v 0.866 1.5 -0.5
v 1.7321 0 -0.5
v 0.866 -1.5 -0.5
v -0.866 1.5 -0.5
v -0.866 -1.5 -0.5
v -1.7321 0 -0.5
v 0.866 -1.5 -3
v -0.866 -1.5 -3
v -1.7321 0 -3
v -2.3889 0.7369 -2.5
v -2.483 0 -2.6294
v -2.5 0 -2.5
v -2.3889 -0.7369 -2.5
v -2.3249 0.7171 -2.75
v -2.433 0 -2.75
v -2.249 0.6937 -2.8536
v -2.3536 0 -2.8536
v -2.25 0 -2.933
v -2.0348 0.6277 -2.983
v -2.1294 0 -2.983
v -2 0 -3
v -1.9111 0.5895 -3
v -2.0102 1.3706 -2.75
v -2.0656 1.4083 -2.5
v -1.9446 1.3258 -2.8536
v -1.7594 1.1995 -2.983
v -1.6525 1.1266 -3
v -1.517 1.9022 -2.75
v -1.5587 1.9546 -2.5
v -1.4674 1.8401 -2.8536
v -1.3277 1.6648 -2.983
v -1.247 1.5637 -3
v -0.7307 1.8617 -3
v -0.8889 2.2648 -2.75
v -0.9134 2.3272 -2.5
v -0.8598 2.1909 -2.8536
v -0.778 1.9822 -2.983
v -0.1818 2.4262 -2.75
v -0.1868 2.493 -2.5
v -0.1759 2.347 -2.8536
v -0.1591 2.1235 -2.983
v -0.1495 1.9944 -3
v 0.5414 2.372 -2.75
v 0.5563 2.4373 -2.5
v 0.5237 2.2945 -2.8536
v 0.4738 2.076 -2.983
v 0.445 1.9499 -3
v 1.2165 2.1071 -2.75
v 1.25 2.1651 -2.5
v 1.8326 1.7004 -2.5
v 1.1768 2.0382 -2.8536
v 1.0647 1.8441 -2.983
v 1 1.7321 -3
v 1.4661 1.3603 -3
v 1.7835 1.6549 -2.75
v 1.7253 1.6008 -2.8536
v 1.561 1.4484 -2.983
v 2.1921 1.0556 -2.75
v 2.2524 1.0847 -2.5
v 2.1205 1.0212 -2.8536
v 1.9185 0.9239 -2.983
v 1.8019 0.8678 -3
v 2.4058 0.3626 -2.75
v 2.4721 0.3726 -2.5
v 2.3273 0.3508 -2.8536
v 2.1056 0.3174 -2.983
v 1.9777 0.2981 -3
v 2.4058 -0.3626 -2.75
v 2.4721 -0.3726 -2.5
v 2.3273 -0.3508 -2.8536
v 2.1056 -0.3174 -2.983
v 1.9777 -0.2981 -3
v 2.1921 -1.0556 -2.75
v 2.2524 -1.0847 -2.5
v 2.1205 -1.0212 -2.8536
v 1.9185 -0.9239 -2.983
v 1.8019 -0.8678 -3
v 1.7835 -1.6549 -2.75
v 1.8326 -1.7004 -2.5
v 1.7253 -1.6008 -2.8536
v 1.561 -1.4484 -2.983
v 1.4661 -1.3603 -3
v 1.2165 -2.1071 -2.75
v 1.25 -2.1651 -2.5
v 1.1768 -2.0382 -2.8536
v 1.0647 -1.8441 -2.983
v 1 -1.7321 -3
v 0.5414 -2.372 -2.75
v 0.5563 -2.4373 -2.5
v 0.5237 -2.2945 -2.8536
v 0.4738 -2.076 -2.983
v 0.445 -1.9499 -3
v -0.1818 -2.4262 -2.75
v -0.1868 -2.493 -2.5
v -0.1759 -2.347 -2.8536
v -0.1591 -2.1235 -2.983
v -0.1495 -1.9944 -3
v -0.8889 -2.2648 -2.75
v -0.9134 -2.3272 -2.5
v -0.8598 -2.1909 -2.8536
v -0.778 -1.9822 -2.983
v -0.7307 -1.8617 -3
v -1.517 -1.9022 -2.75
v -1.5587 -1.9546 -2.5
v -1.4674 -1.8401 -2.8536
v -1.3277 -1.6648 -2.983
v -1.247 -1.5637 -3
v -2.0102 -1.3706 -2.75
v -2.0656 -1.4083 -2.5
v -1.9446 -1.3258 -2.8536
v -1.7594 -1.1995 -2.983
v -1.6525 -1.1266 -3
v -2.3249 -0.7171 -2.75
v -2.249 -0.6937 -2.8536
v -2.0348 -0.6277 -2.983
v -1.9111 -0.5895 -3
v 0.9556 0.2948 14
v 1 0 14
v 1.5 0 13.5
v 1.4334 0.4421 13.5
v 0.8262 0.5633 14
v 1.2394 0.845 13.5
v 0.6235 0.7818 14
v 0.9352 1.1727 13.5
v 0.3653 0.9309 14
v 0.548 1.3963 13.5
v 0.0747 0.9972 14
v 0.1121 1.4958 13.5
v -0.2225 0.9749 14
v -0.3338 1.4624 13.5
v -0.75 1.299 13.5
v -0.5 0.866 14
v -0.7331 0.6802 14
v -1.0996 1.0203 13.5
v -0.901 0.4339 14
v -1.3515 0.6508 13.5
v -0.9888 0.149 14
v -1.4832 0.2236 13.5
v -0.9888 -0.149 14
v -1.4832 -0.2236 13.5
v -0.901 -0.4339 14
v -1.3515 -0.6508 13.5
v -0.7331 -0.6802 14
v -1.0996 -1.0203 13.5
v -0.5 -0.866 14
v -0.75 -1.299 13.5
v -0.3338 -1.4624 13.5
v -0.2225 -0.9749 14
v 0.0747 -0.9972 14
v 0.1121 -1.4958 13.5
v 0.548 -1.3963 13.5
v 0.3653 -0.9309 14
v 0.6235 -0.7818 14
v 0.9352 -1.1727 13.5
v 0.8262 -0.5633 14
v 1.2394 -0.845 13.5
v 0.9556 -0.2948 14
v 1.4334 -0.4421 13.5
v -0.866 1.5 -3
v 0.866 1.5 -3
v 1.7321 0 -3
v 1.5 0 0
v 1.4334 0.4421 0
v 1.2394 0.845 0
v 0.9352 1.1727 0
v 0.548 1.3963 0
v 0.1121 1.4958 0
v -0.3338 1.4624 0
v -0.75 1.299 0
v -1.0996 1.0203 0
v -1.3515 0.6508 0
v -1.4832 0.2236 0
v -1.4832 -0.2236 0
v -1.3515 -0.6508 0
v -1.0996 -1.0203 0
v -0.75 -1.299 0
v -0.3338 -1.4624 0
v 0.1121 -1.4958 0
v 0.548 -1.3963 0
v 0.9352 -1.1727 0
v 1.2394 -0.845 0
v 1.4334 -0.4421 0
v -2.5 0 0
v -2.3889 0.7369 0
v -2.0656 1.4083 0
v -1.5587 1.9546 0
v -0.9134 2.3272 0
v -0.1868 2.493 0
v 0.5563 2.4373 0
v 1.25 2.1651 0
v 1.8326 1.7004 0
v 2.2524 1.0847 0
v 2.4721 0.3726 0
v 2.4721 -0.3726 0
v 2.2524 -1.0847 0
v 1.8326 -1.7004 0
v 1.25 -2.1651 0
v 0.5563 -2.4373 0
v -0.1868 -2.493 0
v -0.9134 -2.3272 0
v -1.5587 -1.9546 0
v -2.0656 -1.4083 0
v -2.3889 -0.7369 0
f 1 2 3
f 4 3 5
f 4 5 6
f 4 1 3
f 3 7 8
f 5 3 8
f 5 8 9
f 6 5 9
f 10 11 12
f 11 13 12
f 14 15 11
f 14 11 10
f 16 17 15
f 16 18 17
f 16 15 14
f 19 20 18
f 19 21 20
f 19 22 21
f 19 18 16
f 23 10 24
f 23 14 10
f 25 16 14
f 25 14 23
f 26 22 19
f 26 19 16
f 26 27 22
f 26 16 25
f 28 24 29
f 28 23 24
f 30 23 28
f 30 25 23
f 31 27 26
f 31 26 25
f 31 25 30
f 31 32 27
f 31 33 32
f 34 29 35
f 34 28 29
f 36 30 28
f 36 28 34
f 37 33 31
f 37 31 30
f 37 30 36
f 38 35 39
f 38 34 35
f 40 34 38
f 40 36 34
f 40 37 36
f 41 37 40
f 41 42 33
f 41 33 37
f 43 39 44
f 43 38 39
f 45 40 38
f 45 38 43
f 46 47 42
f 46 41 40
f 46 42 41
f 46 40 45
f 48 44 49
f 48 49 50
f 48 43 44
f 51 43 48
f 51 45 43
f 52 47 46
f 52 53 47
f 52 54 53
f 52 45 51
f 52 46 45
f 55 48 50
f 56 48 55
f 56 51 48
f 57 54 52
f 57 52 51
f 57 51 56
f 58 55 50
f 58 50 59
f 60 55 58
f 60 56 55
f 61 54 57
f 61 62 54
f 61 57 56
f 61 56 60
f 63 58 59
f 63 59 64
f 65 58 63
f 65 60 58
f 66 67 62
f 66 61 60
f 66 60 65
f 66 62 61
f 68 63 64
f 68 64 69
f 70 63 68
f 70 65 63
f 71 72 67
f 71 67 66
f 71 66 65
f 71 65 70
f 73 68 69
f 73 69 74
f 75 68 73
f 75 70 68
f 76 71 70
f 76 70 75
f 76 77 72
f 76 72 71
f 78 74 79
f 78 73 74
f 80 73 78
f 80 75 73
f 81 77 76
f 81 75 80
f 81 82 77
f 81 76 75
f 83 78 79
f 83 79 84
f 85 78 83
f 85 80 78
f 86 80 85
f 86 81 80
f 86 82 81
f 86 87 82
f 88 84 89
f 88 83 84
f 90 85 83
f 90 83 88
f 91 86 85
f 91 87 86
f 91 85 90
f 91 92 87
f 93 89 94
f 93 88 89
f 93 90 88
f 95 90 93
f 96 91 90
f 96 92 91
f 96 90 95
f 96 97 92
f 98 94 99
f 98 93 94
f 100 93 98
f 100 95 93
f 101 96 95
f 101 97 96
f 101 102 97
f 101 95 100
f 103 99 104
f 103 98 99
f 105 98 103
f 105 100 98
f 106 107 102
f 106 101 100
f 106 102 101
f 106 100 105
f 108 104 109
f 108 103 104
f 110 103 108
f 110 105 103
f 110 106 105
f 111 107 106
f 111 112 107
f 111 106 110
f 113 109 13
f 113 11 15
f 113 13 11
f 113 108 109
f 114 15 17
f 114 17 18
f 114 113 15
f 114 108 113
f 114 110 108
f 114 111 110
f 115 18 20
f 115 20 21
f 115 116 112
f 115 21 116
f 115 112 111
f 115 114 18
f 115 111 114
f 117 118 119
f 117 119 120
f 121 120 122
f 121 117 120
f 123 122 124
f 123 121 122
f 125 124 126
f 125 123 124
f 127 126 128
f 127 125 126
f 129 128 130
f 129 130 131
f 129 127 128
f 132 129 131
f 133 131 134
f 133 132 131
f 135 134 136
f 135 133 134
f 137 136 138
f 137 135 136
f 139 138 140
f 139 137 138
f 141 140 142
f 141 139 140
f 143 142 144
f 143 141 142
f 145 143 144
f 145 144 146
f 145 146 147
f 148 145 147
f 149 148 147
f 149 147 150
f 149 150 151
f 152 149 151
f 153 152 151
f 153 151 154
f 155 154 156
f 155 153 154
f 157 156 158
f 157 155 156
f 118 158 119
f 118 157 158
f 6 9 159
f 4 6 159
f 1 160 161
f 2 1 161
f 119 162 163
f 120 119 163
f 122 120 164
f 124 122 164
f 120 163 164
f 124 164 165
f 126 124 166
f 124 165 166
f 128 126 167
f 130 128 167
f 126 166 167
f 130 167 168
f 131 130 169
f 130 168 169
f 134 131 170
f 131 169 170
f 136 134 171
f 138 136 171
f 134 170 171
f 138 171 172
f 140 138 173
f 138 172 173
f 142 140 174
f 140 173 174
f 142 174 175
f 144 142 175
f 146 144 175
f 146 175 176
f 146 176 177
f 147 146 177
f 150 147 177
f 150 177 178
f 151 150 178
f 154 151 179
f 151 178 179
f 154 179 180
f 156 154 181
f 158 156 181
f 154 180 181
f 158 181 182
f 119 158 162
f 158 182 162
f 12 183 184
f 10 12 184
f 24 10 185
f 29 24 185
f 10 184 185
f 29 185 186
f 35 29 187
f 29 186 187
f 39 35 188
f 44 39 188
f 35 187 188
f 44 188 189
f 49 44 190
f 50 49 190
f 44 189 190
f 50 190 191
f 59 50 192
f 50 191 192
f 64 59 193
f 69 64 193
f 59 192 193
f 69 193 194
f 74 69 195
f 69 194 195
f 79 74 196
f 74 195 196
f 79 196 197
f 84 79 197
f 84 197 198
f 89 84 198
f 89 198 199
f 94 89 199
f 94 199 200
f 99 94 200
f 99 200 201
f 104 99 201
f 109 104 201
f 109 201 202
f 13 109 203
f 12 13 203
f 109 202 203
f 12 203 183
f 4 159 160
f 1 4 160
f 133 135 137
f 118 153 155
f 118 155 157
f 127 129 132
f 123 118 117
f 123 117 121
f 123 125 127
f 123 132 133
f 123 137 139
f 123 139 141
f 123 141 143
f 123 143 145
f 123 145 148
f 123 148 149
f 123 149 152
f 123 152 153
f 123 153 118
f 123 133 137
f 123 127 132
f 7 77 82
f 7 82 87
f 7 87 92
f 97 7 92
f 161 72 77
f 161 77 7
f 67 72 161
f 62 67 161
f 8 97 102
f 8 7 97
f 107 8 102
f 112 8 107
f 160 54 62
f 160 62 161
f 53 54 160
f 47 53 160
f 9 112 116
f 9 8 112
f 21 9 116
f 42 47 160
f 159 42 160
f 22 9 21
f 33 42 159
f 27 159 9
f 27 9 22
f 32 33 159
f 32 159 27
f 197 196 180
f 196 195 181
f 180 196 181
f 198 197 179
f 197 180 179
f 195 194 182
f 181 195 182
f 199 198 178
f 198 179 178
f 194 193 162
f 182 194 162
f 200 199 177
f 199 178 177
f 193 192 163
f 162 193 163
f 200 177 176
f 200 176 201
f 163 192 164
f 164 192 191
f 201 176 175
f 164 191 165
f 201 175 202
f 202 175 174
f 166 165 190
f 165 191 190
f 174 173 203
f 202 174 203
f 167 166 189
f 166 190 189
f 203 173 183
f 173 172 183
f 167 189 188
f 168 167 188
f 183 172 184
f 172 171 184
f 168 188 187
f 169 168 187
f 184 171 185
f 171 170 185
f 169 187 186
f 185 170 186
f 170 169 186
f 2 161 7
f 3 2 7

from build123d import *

# Parameters (mm, degrees)
ESQUISSE1_R             = 1.5
BASE_EXTRUSION_DEPTH    = 14
CHANFREIN1_SIZE         = 0.5
ESQUISSE2_R             = 2.5
BOSS_EXTRU_1_DEPTH      = 3
CONG_1_R                = 0.5
ENL_V_MAT_EXTRU_1_DEPTH = 2.5


with BuildPart() as part:
    # Esquisse1 → Base-Extrusion (new body)
    with BuildSketch(Plane.XY):
        Circle(ESQUISSE1_R)
    extrude(amount=BASE_EXTRUSION_DEPTH)

    # Chanfrein1
    chanfrein1_edges = [part.edges().sort_by_distance(p)[0] for p in [
        (-1.5, 0, 14),
    ]]
    chamfer(chanfrein1_edges, length=CHANFREIN1_SIZE)

    # Esquisse2 → Boss.-Extru.1 (add)
    with BuildSketch(Plane(origin=(0, 0, 0), x_dir=(-1, 0, 0), z_dir=(0, 0, -1))):
        Circle(ESQUISSE2_R)
    extrude(amount=BOSS_EXTRU_1_DEPTH)

    # Congé1
    cong_1_edges = [part.edges().sort_by_distance(p)[0] for p in [
        (2.5, 0, -3),
    ]]
    fillet(cong_1_edges, radius=CONG_1_R)

    # Esquisse3 → Enlèv. mat.-Extru.1 (cut)
    with BuildSketch(Plane(origin=(0, 0, -3), x_dir=(-1, 0, 0), z_dir=(0, 0, -1))):
        Polygon((1.732050808, 0), (0.866025404, 1.5), (-0.866025404, 1.5), (-1.732050808, 0), (-0.866025404, -1.5), (0.866025404, -1.5), align=None)
    extrude(amount=-ENL_V_MAT_EXTRU_1_DEPTH, mode=Mode.SUBTRACT)


solid = part.part
